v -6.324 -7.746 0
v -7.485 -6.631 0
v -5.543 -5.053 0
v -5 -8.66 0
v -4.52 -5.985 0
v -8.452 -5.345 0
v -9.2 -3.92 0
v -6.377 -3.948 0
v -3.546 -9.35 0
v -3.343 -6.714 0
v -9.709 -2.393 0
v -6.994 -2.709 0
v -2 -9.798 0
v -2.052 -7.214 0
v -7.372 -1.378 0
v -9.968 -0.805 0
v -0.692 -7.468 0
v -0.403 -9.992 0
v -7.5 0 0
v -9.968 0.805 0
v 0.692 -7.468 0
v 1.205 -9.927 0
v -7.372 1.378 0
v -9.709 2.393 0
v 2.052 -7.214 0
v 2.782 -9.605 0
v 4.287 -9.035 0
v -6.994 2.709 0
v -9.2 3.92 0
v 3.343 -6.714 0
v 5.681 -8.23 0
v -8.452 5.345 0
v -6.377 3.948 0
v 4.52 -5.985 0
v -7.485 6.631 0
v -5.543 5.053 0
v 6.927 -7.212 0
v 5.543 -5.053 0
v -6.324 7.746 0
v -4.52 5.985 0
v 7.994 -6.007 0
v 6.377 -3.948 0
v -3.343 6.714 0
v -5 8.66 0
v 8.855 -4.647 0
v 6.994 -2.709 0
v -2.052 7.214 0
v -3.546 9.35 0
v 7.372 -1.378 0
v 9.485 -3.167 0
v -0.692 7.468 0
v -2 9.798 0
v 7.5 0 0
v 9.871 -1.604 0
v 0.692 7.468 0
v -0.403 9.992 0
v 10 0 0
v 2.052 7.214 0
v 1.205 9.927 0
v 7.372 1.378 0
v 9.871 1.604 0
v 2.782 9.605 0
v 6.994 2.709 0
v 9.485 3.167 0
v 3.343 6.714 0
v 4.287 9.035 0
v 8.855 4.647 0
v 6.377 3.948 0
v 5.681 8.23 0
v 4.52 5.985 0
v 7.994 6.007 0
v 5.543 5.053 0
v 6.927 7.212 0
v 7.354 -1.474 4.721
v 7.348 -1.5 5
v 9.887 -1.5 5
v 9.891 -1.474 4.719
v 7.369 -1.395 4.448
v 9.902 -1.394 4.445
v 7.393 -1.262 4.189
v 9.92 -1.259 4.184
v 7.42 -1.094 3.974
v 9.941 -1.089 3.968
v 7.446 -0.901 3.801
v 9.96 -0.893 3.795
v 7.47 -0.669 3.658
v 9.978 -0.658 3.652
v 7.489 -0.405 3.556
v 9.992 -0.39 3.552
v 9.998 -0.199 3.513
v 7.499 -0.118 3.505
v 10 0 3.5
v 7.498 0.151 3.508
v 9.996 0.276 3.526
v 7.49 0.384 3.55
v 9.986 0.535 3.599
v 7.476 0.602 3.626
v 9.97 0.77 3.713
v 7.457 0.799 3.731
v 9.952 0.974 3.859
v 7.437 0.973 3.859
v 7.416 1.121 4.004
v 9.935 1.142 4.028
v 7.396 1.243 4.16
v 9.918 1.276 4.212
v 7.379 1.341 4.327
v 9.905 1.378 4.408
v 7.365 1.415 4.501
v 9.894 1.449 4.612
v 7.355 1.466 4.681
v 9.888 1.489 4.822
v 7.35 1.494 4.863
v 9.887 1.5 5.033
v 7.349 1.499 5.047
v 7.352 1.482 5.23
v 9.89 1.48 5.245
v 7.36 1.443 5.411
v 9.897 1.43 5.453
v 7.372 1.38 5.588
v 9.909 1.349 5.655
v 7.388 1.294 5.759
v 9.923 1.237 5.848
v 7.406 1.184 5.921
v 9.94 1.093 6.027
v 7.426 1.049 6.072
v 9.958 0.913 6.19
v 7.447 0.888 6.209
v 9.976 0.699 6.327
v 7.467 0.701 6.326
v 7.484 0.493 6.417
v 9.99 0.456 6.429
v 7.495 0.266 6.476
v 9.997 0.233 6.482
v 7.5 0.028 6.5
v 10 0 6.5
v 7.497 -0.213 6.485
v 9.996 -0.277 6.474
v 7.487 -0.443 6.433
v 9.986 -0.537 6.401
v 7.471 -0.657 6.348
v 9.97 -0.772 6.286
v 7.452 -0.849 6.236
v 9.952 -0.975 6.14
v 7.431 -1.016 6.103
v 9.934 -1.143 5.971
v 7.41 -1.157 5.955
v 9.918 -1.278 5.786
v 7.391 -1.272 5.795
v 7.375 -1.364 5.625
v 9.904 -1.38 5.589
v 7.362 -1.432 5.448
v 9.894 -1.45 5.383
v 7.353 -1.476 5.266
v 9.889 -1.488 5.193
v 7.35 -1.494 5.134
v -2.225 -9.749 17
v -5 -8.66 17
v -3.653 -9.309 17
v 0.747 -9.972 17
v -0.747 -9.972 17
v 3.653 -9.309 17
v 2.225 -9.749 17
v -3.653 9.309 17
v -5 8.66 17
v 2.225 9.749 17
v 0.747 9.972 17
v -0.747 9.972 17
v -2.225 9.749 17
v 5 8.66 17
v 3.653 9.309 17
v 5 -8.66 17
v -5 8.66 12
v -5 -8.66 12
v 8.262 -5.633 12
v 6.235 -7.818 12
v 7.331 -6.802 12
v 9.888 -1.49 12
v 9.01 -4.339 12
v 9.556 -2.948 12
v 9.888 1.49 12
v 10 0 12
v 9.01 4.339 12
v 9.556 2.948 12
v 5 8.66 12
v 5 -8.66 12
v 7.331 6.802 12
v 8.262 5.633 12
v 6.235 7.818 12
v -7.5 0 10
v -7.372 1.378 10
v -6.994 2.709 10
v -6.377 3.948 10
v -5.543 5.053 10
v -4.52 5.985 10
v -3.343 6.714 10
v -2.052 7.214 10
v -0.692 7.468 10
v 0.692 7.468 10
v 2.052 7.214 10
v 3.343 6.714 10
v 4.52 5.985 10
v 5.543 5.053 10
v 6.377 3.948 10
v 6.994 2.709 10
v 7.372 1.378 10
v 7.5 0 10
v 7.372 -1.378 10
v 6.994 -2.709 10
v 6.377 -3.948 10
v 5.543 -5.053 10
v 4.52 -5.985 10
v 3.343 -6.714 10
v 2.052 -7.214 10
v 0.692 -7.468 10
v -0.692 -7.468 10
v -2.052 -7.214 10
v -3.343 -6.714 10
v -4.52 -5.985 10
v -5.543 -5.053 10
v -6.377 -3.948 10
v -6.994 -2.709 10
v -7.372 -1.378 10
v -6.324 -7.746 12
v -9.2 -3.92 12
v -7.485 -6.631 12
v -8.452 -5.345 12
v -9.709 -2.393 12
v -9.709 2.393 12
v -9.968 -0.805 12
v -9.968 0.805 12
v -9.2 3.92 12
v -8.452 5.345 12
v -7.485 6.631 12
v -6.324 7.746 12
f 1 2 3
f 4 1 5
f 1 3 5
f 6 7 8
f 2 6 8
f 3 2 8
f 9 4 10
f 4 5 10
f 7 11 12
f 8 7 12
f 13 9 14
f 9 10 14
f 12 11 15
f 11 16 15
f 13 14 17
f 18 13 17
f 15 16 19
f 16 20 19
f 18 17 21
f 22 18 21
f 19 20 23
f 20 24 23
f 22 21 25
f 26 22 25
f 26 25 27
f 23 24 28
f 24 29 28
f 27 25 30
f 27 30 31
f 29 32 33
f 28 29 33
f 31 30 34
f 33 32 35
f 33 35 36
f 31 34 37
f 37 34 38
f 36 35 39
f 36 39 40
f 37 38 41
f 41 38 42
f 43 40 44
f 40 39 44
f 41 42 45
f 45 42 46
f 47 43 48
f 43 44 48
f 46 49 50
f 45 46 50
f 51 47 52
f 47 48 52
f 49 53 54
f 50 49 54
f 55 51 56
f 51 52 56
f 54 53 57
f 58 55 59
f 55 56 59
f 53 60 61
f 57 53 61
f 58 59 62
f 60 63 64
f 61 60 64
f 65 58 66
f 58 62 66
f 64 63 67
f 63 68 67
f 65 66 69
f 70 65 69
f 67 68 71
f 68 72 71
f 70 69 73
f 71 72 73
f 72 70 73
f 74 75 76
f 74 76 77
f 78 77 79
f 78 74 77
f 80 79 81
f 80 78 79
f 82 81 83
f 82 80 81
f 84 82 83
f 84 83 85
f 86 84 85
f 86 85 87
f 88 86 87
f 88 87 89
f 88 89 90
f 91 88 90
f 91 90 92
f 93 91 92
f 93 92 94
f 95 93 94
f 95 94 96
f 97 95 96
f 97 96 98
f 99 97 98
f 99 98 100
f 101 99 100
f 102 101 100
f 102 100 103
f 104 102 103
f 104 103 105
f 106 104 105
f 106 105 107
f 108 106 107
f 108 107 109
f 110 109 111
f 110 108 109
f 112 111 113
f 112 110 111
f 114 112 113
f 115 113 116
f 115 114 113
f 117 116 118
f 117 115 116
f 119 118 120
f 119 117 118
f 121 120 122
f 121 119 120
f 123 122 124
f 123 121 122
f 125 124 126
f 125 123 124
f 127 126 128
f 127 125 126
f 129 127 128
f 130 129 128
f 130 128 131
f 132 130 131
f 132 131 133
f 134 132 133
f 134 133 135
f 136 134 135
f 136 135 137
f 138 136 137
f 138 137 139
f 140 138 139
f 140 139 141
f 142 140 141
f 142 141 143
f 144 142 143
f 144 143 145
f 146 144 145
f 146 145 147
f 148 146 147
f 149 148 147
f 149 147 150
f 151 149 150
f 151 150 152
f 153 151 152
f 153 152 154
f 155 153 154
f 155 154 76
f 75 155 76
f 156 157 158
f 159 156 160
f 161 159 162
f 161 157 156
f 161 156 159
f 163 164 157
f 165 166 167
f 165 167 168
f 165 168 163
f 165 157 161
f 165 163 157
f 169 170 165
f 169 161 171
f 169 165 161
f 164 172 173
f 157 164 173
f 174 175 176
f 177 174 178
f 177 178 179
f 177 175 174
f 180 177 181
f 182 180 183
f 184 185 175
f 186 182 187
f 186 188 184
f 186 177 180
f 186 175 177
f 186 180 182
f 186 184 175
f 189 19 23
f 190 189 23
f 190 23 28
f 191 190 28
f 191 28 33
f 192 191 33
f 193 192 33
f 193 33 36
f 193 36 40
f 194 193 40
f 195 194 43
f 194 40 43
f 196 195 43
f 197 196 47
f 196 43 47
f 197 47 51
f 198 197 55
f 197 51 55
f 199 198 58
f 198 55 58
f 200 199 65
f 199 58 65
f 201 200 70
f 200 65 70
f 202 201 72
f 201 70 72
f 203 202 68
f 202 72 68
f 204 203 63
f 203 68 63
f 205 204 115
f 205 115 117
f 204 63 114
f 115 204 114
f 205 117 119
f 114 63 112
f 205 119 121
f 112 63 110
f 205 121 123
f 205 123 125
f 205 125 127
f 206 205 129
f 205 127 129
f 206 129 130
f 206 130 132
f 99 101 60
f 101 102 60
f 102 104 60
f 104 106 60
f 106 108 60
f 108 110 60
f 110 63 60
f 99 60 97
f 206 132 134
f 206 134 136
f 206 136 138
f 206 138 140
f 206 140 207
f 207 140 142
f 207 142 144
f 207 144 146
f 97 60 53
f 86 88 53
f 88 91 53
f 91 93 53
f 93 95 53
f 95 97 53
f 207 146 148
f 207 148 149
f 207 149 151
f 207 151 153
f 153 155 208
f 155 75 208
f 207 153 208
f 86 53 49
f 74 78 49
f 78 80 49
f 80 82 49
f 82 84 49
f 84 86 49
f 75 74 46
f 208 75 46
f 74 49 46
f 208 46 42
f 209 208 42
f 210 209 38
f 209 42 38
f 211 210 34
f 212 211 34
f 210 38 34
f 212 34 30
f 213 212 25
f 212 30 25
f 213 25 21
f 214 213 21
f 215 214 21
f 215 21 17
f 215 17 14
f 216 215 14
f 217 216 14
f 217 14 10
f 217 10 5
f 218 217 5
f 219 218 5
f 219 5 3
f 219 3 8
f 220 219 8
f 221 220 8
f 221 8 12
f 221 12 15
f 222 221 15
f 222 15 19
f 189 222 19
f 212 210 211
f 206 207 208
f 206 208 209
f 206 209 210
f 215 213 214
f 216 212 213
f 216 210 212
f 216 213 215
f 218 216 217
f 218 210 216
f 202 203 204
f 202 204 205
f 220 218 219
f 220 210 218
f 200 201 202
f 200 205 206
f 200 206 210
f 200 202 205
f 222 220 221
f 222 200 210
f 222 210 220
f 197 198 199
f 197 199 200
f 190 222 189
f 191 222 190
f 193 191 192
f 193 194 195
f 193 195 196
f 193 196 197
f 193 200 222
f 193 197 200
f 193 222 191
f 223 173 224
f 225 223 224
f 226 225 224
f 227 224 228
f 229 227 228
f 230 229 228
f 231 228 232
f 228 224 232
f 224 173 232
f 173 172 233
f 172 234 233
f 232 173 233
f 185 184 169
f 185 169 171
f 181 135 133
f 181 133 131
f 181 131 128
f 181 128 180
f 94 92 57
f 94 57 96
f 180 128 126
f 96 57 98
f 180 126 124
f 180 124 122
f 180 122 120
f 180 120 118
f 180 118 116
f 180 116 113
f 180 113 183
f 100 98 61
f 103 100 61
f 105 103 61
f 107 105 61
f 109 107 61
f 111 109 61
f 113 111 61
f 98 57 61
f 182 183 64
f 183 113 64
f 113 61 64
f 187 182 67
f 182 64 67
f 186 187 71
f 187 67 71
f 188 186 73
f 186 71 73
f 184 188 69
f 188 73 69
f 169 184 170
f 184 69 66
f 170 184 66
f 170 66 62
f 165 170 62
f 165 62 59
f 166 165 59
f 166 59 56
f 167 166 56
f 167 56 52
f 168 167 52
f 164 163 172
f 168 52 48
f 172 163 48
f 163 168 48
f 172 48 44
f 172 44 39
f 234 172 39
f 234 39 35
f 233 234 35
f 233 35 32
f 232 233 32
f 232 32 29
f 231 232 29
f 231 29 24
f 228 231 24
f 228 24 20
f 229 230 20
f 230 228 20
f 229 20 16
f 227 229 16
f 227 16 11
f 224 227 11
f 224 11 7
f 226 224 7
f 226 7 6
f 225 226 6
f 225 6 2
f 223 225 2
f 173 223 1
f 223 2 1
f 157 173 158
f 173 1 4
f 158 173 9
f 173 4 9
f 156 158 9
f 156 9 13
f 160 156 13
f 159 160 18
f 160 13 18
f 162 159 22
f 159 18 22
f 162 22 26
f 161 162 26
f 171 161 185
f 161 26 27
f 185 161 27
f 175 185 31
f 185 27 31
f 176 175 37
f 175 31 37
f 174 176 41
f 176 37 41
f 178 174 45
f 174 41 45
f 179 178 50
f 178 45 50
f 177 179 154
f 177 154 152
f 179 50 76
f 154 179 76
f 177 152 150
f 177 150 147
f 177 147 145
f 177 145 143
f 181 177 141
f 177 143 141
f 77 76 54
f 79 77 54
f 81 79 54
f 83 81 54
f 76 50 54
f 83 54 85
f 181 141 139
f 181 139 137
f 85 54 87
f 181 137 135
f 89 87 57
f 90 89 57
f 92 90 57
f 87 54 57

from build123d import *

# Parameters (mm, degrees)
ESBO_O1_R                  = 10
RESSALTO_EXTRUS_O1_DEPTH   = 17
ESBO_O4_R                  = 7.5
CORTE_EXTRUS_O3_DEPTH      = 10
CORTE_EXTRUS_O1_START      = -5
CORTE_EXTRUS_O1_DEPTH      = 5
CORTE_EXTRUS_O4_REACH      = 26.779
CORTE_EXTRUS_O4_END_RADIUS = 10
ESBO_O5_R                  = 1.5


with BuildPart() as part:
    # Esboço1 → Ressalto-extrusão1 (new body)
    with BuildSketch(Plane.XY):
        Circle(ESBO_O1_R)
    extrude(amount=RESSALTO_EXTRUS_O1_DEPTH)

    # Esboço4 → Corte-extrusão3 (cut)
    with BuildSketch(Plane(origin=(0, 0, 0), x_dir=(-1, 0, 0), z_dir=(0, 0, -1))):
        Circle(ESBO_O4_R)
    extrude(amount=-CORTE_EXTRUS_O3_DEPTH, mode=Mode.SUBTRACT)

    # Esboço2 → Corte-extrusão1 (cut)
    with BuildSketch(Plane.XY.offset(17).offset(CORTE_EXTRUS_O1_START)):
        with BuildLine():
            Line((-5, 8.660254038), (-5, -8.660254038))
            ThreePointArc((-5, -8.660254038), (-10, 0), (-5, 8.660254038))
        make_face()
        with BuildLine():
            Line((5, 8.660254038), (5, -8.660254038))
            ThreePointArc((5, -8.660254038), (10, 0), (5, 8.660254038))
        make_face()
    extrude(amount=CORTE_EXTRUS_O1_DEPTH, mode=Mode.SUBTRACT)

    # Corte-extrusão4: up to this cylinder (the profile starts inside it)
    corte_extrus_o4_end = Plane(origin=(0, 0, 5), z_dir=(0, 0, -1)) * Cylinder(CORTE_EXTRUS_O4_END_RADIUS, 74.558, mode=Mode.PRIVATE)
    # Esboço5 → Corte-extrusão4 (cut, up to the surface)
    with BuildSketch(Plane(origin=(5, 0, 0), x_dir=(0, 0, -1), z_dir=(1, 0, 0)), mode=Mode.PRIVATE) as corte_extrus_o4_sk1:
        with Locations(Location((-5, 0, 0), (0, 0, 270))):
            Circle(ESBO_O5_R)
    corte_extrus_o4_tool1 = extrude(corte_extrus_o4_sk1.sketch, amount=CORTE_EXTRUS_O4_REACH, mode=Mode.PRIVATE) & corte_extrus_o4_end
    add(corte_extrus_o4_tool1.solids().sort_by_distance((5, 0, 5))[0], mode=Mode.SUBTRACT)


solid = part.part
